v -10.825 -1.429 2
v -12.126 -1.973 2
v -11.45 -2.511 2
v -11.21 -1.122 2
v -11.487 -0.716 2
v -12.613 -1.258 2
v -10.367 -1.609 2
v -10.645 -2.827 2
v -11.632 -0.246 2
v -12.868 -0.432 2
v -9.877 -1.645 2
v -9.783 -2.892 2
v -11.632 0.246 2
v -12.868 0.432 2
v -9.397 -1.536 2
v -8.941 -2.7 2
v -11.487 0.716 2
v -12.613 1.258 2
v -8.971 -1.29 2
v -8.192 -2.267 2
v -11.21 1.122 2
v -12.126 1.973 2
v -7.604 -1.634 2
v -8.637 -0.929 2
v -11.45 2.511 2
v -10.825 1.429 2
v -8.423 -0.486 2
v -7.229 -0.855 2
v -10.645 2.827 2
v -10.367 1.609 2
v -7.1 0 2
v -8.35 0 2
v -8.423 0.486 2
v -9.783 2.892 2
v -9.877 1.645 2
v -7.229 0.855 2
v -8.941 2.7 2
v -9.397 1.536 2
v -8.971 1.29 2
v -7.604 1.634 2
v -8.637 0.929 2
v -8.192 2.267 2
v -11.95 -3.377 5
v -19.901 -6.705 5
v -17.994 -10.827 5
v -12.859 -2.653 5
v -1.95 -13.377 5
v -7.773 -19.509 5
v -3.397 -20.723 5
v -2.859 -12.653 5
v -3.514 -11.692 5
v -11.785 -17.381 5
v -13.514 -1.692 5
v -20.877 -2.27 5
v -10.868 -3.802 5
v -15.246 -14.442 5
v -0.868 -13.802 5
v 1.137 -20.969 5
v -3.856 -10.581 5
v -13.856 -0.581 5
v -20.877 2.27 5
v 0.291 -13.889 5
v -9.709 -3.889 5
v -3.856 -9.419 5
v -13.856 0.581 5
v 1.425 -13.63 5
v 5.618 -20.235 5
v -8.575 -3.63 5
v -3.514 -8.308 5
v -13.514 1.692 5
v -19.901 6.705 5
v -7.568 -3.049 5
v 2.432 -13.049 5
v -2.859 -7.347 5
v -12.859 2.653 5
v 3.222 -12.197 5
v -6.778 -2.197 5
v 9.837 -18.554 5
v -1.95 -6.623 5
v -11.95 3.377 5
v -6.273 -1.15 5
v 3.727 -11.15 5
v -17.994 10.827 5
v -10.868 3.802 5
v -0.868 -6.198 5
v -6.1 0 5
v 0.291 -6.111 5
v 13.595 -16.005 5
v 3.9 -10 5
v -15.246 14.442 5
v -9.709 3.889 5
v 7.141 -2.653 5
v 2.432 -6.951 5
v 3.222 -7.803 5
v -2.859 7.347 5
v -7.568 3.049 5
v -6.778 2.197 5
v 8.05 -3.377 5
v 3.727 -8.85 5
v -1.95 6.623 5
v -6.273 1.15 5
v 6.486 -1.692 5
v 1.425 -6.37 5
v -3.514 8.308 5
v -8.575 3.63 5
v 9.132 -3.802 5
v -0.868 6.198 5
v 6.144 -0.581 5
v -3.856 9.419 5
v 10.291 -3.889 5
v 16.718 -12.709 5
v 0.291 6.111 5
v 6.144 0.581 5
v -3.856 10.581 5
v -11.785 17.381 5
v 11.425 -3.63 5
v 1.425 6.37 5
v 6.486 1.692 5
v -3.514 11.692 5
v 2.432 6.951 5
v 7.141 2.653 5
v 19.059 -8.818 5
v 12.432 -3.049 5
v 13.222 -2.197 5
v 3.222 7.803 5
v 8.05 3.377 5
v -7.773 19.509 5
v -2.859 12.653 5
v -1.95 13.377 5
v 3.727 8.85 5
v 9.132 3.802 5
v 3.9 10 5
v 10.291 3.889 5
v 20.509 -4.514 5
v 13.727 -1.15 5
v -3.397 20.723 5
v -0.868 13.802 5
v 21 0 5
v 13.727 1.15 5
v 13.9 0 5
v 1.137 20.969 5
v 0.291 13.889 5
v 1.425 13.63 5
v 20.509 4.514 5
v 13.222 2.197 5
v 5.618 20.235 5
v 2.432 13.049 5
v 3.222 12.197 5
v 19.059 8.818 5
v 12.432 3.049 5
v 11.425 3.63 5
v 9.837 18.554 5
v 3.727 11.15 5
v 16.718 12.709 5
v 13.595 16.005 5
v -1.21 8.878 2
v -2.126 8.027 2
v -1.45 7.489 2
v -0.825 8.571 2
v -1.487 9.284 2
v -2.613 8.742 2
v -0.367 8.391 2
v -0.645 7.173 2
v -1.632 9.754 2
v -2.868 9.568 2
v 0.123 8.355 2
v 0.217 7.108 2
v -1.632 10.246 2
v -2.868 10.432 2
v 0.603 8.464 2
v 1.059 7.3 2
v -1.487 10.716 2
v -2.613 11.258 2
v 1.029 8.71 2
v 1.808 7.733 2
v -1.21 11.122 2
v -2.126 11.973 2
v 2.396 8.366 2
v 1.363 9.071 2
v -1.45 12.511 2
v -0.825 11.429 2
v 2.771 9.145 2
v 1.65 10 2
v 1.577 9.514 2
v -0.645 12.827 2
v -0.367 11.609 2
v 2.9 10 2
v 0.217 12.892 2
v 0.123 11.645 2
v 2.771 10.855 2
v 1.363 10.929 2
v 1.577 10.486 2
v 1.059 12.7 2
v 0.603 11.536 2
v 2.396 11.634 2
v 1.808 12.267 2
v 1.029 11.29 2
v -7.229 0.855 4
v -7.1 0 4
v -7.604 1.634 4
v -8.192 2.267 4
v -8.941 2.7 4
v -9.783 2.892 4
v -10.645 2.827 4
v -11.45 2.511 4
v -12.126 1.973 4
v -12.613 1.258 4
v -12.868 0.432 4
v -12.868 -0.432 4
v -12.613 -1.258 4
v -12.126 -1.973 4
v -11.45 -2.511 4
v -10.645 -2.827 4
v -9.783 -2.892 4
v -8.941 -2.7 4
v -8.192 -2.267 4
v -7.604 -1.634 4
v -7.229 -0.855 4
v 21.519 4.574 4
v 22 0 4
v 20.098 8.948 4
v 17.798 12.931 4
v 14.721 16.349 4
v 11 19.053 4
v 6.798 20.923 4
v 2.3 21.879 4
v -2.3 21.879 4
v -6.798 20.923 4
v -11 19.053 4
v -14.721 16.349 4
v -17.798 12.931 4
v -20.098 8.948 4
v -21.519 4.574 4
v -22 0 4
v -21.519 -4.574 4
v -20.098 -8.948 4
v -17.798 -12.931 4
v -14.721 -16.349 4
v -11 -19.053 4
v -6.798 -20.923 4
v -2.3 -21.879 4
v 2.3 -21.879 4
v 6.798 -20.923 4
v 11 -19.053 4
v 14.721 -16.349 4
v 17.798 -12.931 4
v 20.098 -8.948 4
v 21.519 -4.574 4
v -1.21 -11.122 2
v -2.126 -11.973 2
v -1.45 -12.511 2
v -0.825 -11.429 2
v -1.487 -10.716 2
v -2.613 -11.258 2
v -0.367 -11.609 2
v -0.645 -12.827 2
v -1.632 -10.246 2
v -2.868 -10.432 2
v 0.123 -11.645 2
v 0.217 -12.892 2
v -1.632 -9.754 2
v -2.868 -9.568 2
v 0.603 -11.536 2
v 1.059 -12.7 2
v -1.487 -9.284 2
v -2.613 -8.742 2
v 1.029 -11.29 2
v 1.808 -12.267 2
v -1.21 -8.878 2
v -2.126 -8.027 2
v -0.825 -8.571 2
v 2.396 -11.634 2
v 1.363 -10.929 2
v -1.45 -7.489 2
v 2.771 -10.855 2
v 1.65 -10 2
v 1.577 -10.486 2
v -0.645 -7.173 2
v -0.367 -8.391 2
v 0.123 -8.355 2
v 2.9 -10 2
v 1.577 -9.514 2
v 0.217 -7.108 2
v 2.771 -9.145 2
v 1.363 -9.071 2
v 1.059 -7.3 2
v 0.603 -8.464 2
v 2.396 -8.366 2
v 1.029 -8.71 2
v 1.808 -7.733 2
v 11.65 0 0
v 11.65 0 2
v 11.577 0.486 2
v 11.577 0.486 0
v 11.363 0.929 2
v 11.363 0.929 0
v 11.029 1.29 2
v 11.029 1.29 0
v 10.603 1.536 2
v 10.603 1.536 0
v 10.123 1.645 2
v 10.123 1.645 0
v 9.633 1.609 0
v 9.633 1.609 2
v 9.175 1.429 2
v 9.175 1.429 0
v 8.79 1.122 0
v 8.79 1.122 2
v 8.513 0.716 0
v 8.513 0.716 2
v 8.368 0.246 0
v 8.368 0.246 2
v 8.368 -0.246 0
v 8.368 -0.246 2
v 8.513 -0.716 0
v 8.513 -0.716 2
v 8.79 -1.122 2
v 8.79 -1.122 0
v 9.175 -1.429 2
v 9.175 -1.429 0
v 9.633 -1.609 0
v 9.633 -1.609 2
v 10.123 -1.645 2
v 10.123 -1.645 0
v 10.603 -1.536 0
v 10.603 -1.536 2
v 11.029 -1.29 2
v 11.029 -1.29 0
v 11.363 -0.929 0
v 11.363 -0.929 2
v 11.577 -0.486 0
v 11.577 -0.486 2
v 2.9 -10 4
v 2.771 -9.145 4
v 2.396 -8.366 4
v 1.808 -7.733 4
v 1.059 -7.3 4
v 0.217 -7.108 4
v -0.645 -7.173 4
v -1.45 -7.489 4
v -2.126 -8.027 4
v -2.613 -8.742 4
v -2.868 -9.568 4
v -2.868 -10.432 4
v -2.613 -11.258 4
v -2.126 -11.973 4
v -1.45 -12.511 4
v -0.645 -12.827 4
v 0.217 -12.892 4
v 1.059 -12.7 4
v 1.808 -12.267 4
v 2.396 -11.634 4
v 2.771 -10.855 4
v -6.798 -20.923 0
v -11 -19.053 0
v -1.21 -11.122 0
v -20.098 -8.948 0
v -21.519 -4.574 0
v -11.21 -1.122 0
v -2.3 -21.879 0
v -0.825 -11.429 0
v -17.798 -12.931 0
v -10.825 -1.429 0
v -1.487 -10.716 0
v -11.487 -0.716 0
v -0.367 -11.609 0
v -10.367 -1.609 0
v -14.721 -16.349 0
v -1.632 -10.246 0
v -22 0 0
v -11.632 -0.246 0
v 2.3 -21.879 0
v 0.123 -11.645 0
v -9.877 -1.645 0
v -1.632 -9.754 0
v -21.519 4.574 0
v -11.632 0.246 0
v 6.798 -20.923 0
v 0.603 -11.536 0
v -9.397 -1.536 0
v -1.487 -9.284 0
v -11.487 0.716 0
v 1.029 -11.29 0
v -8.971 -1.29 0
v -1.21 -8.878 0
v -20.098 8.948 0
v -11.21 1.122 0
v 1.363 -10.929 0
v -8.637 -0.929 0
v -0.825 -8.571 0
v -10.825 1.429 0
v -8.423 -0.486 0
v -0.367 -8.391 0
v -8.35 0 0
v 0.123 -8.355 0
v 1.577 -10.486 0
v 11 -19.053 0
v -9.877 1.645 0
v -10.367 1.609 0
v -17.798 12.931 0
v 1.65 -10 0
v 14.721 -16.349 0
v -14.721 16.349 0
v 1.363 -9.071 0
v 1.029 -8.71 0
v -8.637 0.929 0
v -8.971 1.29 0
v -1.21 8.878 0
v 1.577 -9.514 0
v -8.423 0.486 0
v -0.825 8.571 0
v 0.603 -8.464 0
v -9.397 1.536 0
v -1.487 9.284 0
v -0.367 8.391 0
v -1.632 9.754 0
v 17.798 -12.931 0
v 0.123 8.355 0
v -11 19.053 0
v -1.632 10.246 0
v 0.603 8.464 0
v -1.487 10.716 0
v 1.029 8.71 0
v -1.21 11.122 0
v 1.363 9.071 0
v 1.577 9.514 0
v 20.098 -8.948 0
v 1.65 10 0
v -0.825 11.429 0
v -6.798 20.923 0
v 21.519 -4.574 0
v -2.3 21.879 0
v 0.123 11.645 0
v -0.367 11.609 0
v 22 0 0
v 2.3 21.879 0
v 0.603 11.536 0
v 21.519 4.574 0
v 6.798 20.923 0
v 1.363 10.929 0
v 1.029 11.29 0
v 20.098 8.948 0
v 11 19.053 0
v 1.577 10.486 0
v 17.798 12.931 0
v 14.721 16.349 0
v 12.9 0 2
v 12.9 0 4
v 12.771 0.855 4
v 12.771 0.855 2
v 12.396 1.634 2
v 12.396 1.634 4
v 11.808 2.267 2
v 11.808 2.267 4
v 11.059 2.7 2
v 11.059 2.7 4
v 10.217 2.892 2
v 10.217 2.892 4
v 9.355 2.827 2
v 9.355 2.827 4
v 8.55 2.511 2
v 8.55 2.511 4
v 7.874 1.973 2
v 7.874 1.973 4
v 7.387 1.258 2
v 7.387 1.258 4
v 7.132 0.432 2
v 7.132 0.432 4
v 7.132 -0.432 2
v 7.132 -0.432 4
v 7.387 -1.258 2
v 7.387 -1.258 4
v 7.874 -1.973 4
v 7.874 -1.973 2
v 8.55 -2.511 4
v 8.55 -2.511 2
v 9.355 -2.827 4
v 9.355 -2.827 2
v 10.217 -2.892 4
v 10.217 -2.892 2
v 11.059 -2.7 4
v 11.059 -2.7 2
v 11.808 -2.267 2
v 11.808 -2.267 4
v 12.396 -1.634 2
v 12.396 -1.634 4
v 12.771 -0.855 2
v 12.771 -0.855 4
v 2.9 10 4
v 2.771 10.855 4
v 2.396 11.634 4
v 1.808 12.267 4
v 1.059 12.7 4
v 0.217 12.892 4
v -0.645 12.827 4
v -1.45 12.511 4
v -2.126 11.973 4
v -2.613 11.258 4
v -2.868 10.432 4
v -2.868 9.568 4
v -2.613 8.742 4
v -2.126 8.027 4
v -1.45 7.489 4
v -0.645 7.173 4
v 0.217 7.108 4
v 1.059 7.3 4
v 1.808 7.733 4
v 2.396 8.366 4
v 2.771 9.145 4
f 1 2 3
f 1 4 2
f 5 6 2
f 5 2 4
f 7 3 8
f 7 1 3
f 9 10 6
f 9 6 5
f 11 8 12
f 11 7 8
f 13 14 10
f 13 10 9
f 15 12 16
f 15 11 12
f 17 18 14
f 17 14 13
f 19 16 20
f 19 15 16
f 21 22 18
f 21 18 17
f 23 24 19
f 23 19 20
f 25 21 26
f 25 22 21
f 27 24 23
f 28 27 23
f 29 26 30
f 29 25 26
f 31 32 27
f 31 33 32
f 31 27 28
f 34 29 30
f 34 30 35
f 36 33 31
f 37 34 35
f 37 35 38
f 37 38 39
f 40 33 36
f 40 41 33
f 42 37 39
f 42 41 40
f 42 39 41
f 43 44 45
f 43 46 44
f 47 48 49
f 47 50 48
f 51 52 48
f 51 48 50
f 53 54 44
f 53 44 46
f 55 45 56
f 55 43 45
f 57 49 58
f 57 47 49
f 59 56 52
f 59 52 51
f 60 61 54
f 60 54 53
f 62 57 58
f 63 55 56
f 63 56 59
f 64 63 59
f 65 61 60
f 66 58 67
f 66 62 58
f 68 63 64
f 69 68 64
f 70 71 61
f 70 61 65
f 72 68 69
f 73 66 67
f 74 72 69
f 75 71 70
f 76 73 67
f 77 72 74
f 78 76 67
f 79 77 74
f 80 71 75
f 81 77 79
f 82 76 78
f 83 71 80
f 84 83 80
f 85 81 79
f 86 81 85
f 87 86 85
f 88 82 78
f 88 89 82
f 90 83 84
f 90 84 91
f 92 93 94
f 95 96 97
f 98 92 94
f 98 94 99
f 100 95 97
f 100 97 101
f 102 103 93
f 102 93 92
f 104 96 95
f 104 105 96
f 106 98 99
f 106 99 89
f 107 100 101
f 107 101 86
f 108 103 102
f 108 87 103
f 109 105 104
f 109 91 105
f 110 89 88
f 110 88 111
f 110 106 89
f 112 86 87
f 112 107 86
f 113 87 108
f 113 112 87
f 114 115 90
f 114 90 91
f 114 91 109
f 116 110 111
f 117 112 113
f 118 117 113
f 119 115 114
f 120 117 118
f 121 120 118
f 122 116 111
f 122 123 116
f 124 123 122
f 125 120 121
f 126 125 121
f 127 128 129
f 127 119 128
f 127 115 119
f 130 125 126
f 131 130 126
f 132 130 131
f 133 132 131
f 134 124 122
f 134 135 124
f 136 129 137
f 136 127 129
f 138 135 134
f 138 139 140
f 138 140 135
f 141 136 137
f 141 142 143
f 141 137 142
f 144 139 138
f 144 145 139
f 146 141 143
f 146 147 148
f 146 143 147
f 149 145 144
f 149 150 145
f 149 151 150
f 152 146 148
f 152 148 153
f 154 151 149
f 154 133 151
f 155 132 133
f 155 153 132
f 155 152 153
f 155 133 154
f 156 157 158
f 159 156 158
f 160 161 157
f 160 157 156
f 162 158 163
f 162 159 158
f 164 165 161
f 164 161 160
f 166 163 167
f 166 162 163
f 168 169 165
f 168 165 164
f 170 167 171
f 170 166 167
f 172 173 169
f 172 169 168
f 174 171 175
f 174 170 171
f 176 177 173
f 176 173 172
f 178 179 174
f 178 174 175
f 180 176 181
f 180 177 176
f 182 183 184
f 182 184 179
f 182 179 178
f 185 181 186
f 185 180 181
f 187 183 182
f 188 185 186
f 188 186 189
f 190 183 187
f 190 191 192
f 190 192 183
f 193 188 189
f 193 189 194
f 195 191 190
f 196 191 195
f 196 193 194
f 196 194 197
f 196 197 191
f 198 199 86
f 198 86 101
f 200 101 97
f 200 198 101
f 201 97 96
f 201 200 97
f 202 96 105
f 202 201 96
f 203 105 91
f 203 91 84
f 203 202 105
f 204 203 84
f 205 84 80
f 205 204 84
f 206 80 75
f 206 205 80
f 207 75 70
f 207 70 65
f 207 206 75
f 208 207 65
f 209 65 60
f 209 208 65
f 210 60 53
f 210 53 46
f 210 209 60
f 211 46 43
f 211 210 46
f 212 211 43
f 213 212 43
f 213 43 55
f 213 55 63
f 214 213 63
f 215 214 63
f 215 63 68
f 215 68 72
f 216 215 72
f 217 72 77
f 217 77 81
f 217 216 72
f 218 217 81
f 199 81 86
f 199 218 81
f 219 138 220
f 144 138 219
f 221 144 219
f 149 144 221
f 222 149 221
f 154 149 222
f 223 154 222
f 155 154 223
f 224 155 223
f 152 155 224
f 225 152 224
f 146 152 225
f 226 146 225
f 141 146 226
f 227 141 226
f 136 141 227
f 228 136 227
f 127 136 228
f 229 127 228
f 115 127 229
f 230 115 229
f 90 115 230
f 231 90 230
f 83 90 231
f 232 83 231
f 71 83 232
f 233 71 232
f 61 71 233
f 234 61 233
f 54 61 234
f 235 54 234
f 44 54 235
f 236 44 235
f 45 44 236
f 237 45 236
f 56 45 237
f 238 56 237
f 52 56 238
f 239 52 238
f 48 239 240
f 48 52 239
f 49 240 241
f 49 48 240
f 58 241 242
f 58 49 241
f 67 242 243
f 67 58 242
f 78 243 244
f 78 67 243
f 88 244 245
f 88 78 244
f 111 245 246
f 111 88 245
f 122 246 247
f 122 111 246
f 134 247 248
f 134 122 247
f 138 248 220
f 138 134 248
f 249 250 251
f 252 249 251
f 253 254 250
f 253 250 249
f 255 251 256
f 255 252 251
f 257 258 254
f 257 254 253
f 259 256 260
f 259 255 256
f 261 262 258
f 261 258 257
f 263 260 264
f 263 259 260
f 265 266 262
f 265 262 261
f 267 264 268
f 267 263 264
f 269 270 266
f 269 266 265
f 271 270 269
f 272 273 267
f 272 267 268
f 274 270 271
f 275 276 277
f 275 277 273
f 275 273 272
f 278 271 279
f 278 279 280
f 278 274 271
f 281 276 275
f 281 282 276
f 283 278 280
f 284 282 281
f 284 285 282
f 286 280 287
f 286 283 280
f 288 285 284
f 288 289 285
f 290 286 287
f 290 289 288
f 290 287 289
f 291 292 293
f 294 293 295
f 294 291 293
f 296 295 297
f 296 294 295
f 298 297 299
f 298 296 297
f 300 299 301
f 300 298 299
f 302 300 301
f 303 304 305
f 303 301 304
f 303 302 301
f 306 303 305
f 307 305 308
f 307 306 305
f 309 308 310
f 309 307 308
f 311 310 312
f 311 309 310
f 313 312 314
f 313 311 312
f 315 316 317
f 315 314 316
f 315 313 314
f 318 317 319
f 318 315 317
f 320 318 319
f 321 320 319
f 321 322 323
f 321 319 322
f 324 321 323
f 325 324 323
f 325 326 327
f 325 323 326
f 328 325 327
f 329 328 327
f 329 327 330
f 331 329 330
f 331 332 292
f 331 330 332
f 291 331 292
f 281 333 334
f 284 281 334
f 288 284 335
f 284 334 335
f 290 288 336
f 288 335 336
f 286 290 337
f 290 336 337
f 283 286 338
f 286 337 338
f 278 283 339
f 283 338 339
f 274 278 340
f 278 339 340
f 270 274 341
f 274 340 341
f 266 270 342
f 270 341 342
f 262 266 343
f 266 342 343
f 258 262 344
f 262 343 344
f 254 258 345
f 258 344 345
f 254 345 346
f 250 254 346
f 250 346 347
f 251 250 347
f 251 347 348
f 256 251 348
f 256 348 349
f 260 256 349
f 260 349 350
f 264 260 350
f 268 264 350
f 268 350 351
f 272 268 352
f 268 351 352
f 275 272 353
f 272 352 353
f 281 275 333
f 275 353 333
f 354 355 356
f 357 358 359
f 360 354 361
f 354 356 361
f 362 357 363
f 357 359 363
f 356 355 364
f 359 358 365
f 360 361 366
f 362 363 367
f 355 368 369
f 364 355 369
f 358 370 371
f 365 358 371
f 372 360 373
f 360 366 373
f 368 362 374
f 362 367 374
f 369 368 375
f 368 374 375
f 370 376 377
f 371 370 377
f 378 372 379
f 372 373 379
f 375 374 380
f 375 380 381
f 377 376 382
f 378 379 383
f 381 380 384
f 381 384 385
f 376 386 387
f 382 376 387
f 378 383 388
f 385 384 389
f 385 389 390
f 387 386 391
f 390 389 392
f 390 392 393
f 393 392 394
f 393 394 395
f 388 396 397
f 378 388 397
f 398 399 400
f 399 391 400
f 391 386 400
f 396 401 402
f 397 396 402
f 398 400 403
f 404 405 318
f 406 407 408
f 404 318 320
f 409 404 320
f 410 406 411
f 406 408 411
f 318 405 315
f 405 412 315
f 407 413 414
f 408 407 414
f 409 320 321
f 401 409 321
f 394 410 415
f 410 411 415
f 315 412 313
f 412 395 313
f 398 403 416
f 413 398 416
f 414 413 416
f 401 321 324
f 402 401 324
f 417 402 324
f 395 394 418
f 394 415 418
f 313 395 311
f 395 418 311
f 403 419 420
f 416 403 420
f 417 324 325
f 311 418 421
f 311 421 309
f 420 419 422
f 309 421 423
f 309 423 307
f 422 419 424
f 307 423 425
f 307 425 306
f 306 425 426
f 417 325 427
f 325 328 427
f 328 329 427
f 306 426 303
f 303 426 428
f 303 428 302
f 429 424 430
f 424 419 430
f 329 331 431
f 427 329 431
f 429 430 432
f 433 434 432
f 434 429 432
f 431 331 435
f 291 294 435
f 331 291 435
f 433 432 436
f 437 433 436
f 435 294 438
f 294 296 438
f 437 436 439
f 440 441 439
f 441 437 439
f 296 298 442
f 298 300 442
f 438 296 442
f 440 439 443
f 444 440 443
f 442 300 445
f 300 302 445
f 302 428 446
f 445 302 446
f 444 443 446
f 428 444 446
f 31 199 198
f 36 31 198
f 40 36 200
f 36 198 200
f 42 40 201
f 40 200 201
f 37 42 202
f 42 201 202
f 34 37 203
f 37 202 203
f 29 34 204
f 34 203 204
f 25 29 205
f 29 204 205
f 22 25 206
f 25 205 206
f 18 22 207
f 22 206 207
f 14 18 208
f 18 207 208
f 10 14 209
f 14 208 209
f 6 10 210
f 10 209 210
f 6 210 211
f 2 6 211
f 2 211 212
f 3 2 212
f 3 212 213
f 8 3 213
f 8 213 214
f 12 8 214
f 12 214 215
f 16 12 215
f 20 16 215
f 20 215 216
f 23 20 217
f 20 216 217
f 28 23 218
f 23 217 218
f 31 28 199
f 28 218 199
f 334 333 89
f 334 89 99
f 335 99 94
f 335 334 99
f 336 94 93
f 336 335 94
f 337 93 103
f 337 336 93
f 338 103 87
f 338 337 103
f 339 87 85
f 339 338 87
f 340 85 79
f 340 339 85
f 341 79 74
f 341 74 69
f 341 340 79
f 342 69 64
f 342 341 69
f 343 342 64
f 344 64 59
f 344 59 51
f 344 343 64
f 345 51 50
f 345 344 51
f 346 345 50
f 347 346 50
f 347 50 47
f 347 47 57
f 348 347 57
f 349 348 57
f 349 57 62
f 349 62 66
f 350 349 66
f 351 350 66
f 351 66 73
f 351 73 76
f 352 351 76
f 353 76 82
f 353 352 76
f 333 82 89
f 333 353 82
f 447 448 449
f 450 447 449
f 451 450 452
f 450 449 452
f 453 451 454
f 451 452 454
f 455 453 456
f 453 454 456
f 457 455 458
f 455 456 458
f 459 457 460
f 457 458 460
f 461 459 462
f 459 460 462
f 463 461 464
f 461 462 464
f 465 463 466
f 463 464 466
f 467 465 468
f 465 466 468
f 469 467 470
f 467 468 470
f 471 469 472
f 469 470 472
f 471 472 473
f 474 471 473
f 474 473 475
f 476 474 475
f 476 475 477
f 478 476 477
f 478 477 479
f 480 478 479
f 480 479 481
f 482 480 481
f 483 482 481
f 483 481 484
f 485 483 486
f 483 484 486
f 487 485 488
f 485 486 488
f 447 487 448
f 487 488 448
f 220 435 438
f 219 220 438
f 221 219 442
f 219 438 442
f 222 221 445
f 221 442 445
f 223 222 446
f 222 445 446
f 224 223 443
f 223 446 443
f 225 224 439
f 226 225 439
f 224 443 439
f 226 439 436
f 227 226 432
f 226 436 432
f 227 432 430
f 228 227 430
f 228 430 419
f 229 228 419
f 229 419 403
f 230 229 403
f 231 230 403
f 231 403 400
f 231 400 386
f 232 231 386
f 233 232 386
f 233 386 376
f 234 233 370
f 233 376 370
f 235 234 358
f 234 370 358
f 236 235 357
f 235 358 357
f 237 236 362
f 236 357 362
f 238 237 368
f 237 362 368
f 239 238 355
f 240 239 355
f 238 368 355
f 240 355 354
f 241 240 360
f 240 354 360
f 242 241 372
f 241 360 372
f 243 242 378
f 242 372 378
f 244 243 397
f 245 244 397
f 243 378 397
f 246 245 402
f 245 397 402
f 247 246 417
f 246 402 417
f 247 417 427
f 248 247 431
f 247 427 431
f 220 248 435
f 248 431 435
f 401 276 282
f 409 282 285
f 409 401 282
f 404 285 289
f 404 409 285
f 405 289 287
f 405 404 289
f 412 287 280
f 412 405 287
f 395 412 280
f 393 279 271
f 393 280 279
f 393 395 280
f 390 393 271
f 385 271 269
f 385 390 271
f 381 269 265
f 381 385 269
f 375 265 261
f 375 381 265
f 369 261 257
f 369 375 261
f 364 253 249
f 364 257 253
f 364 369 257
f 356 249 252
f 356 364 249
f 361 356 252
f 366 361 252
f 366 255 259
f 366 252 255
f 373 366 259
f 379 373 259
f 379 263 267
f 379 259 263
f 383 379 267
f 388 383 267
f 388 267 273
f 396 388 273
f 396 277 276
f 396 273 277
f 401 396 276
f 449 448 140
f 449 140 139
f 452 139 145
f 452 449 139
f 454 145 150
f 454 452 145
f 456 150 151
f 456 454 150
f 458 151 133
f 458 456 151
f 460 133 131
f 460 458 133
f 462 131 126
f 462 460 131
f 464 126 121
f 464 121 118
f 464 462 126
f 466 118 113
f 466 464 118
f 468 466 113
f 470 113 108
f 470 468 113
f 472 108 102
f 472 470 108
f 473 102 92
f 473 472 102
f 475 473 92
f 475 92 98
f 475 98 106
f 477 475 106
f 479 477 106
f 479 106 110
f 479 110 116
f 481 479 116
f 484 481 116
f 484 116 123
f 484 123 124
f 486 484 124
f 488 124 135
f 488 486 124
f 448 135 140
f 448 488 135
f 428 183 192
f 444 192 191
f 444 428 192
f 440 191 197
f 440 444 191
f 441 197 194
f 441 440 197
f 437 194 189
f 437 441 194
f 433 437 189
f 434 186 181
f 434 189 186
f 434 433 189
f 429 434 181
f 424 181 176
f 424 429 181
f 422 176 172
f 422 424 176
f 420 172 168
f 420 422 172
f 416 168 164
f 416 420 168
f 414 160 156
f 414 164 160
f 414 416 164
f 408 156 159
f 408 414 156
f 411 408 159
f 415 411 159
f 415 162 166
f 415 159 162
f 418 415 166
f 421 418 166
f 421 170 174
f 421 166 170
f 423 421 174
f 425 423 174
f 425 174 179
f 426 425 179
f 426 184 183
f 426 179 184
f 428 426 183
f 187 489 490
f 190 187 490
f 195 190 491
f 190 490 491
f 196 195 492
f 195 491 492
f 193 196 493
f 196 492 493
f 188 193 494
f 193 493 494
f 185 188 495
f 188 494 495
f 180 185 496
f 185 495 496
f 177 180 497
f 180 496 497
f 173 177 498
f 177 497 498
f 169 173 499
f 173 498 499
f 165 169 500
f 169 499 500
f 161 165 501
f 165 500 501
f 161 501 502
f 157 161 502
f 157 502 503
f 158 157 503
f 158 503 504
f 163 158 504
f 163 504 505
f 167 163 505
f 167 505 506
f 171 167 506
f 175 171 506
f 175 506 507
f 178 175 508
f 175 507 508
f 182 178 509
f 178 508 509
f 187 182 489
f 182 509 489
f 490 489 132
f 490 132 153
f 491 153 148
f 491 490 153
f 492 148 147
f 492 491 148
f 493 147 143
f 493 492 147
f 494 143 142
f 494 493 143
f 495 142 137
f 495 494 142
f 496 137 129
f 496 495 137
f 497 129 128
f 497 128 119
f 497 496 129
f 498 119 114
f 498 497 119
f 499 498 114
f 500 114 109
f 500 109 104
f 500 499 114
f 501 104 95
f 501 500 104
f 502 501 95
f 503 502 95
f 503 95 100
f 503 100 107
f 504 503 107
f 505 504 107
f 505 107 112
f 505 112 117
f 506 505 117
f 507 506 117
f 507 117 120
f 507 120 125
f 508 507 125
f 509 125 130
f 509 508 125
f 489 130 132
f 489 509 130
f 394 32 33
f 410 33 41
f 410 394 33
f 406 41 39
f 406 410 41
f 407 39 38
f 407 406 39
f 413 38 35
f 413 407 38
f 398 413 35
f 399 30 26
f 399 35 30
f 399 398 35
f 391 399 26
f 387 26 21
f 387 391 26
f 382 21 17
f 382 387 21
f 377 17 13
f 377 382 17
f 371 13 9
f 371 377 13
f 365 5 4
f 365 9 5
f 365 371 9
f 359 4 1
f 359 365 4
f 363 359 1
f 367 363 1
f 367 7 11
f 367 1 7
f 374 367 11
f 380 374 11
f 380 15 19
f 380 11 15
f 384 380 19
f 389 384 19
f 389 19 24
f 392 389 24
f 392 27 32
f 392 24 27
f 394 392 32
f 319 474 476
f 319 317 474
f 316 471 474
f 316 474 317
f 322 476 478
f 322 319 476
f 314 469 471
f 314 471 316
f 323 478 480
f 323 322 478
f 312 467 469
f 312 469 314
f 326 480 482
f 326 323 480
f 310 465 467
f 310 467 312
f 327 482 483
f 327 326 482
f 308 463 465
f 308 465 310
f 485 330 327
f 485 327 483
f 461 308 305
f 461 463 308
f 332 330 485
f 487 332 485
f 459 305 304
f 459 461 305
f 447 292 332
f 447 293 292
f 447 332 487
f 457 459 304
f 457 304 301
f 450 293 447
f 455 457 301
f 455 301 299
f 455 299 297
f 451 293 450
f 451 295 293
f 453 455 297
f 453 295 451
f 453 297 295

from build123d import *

# Parameters (mm, degrees)
SKIZZE1_R                       = 22
SKIZZE1_R_2                     = 1.65
AUFSATZ_LINEAR_AUSTRAGEN1_DEPTH = 5
SKIZZE2_R                       = 2.9
SCHNITT_LINEAR_AUSTRAGEN1_DEPTH = 3
VERRUNDUNG1_SIZE                = 1


with BuildPart() as part:
    # Skizze1 → Aufsatz-Linear austragen1 (new body)
    with BuildSketch(Plane.XY):
        Circle(SKIZZE1_R)
        with Locations((10, 0)):
            Circle(SKIZZE1_R_2, mode=Mode.SUBTRACT)
        with Locations((0, -10)):
            Circle(SKIZZE1_R_2, mode=Mode.SUBTRACT)
        with Locations((-10, 0)):
            Circle(SKIZZE1_R_2, mode=Mode.SUBTRACT)
        with Locations((0, 10)):
            Circle(SKIZZE1_R_2, mode=Mode.SUBTRACT)
    extrude(amount=AUFSATZ_LINEAR_AUSTRAGEN1_DEPTH)

    # Skizze2 → Schnitt-Linear austragen1 (cut)
    with BuildSketch(Plane.XY.offset(5)):
        with Locations((0, 10)):
            Circle(SKIZZE2_R)
        with Locations((10, 0)):
            Circle(SKIZZE2_R)
        with Locations((0, -10)):
            Circle(SKIZZE2_R)
        with Locations((-10, 0)):
            Circle(SKIZZE2_R)
    extrude(amount=-SCHNITT_LINEAR_AUSTRAGEN1_DEPTH, mode=Mode.SUBTRACT)

    # Verrundung1
    verrundung1_edges = [part.edges().sort_by_distance(p)[0] for p in [
        (-2.9, 10, 5),
        (7.1, 0, 5),
        (-22, 0, 5),
        (-2.9, -10, 5),
        (-12.9, 0, 5),
    ]]
    chamfer(verrundung1_edges, length=VERRUNDUNG1_SIZE)


solid = part.part
